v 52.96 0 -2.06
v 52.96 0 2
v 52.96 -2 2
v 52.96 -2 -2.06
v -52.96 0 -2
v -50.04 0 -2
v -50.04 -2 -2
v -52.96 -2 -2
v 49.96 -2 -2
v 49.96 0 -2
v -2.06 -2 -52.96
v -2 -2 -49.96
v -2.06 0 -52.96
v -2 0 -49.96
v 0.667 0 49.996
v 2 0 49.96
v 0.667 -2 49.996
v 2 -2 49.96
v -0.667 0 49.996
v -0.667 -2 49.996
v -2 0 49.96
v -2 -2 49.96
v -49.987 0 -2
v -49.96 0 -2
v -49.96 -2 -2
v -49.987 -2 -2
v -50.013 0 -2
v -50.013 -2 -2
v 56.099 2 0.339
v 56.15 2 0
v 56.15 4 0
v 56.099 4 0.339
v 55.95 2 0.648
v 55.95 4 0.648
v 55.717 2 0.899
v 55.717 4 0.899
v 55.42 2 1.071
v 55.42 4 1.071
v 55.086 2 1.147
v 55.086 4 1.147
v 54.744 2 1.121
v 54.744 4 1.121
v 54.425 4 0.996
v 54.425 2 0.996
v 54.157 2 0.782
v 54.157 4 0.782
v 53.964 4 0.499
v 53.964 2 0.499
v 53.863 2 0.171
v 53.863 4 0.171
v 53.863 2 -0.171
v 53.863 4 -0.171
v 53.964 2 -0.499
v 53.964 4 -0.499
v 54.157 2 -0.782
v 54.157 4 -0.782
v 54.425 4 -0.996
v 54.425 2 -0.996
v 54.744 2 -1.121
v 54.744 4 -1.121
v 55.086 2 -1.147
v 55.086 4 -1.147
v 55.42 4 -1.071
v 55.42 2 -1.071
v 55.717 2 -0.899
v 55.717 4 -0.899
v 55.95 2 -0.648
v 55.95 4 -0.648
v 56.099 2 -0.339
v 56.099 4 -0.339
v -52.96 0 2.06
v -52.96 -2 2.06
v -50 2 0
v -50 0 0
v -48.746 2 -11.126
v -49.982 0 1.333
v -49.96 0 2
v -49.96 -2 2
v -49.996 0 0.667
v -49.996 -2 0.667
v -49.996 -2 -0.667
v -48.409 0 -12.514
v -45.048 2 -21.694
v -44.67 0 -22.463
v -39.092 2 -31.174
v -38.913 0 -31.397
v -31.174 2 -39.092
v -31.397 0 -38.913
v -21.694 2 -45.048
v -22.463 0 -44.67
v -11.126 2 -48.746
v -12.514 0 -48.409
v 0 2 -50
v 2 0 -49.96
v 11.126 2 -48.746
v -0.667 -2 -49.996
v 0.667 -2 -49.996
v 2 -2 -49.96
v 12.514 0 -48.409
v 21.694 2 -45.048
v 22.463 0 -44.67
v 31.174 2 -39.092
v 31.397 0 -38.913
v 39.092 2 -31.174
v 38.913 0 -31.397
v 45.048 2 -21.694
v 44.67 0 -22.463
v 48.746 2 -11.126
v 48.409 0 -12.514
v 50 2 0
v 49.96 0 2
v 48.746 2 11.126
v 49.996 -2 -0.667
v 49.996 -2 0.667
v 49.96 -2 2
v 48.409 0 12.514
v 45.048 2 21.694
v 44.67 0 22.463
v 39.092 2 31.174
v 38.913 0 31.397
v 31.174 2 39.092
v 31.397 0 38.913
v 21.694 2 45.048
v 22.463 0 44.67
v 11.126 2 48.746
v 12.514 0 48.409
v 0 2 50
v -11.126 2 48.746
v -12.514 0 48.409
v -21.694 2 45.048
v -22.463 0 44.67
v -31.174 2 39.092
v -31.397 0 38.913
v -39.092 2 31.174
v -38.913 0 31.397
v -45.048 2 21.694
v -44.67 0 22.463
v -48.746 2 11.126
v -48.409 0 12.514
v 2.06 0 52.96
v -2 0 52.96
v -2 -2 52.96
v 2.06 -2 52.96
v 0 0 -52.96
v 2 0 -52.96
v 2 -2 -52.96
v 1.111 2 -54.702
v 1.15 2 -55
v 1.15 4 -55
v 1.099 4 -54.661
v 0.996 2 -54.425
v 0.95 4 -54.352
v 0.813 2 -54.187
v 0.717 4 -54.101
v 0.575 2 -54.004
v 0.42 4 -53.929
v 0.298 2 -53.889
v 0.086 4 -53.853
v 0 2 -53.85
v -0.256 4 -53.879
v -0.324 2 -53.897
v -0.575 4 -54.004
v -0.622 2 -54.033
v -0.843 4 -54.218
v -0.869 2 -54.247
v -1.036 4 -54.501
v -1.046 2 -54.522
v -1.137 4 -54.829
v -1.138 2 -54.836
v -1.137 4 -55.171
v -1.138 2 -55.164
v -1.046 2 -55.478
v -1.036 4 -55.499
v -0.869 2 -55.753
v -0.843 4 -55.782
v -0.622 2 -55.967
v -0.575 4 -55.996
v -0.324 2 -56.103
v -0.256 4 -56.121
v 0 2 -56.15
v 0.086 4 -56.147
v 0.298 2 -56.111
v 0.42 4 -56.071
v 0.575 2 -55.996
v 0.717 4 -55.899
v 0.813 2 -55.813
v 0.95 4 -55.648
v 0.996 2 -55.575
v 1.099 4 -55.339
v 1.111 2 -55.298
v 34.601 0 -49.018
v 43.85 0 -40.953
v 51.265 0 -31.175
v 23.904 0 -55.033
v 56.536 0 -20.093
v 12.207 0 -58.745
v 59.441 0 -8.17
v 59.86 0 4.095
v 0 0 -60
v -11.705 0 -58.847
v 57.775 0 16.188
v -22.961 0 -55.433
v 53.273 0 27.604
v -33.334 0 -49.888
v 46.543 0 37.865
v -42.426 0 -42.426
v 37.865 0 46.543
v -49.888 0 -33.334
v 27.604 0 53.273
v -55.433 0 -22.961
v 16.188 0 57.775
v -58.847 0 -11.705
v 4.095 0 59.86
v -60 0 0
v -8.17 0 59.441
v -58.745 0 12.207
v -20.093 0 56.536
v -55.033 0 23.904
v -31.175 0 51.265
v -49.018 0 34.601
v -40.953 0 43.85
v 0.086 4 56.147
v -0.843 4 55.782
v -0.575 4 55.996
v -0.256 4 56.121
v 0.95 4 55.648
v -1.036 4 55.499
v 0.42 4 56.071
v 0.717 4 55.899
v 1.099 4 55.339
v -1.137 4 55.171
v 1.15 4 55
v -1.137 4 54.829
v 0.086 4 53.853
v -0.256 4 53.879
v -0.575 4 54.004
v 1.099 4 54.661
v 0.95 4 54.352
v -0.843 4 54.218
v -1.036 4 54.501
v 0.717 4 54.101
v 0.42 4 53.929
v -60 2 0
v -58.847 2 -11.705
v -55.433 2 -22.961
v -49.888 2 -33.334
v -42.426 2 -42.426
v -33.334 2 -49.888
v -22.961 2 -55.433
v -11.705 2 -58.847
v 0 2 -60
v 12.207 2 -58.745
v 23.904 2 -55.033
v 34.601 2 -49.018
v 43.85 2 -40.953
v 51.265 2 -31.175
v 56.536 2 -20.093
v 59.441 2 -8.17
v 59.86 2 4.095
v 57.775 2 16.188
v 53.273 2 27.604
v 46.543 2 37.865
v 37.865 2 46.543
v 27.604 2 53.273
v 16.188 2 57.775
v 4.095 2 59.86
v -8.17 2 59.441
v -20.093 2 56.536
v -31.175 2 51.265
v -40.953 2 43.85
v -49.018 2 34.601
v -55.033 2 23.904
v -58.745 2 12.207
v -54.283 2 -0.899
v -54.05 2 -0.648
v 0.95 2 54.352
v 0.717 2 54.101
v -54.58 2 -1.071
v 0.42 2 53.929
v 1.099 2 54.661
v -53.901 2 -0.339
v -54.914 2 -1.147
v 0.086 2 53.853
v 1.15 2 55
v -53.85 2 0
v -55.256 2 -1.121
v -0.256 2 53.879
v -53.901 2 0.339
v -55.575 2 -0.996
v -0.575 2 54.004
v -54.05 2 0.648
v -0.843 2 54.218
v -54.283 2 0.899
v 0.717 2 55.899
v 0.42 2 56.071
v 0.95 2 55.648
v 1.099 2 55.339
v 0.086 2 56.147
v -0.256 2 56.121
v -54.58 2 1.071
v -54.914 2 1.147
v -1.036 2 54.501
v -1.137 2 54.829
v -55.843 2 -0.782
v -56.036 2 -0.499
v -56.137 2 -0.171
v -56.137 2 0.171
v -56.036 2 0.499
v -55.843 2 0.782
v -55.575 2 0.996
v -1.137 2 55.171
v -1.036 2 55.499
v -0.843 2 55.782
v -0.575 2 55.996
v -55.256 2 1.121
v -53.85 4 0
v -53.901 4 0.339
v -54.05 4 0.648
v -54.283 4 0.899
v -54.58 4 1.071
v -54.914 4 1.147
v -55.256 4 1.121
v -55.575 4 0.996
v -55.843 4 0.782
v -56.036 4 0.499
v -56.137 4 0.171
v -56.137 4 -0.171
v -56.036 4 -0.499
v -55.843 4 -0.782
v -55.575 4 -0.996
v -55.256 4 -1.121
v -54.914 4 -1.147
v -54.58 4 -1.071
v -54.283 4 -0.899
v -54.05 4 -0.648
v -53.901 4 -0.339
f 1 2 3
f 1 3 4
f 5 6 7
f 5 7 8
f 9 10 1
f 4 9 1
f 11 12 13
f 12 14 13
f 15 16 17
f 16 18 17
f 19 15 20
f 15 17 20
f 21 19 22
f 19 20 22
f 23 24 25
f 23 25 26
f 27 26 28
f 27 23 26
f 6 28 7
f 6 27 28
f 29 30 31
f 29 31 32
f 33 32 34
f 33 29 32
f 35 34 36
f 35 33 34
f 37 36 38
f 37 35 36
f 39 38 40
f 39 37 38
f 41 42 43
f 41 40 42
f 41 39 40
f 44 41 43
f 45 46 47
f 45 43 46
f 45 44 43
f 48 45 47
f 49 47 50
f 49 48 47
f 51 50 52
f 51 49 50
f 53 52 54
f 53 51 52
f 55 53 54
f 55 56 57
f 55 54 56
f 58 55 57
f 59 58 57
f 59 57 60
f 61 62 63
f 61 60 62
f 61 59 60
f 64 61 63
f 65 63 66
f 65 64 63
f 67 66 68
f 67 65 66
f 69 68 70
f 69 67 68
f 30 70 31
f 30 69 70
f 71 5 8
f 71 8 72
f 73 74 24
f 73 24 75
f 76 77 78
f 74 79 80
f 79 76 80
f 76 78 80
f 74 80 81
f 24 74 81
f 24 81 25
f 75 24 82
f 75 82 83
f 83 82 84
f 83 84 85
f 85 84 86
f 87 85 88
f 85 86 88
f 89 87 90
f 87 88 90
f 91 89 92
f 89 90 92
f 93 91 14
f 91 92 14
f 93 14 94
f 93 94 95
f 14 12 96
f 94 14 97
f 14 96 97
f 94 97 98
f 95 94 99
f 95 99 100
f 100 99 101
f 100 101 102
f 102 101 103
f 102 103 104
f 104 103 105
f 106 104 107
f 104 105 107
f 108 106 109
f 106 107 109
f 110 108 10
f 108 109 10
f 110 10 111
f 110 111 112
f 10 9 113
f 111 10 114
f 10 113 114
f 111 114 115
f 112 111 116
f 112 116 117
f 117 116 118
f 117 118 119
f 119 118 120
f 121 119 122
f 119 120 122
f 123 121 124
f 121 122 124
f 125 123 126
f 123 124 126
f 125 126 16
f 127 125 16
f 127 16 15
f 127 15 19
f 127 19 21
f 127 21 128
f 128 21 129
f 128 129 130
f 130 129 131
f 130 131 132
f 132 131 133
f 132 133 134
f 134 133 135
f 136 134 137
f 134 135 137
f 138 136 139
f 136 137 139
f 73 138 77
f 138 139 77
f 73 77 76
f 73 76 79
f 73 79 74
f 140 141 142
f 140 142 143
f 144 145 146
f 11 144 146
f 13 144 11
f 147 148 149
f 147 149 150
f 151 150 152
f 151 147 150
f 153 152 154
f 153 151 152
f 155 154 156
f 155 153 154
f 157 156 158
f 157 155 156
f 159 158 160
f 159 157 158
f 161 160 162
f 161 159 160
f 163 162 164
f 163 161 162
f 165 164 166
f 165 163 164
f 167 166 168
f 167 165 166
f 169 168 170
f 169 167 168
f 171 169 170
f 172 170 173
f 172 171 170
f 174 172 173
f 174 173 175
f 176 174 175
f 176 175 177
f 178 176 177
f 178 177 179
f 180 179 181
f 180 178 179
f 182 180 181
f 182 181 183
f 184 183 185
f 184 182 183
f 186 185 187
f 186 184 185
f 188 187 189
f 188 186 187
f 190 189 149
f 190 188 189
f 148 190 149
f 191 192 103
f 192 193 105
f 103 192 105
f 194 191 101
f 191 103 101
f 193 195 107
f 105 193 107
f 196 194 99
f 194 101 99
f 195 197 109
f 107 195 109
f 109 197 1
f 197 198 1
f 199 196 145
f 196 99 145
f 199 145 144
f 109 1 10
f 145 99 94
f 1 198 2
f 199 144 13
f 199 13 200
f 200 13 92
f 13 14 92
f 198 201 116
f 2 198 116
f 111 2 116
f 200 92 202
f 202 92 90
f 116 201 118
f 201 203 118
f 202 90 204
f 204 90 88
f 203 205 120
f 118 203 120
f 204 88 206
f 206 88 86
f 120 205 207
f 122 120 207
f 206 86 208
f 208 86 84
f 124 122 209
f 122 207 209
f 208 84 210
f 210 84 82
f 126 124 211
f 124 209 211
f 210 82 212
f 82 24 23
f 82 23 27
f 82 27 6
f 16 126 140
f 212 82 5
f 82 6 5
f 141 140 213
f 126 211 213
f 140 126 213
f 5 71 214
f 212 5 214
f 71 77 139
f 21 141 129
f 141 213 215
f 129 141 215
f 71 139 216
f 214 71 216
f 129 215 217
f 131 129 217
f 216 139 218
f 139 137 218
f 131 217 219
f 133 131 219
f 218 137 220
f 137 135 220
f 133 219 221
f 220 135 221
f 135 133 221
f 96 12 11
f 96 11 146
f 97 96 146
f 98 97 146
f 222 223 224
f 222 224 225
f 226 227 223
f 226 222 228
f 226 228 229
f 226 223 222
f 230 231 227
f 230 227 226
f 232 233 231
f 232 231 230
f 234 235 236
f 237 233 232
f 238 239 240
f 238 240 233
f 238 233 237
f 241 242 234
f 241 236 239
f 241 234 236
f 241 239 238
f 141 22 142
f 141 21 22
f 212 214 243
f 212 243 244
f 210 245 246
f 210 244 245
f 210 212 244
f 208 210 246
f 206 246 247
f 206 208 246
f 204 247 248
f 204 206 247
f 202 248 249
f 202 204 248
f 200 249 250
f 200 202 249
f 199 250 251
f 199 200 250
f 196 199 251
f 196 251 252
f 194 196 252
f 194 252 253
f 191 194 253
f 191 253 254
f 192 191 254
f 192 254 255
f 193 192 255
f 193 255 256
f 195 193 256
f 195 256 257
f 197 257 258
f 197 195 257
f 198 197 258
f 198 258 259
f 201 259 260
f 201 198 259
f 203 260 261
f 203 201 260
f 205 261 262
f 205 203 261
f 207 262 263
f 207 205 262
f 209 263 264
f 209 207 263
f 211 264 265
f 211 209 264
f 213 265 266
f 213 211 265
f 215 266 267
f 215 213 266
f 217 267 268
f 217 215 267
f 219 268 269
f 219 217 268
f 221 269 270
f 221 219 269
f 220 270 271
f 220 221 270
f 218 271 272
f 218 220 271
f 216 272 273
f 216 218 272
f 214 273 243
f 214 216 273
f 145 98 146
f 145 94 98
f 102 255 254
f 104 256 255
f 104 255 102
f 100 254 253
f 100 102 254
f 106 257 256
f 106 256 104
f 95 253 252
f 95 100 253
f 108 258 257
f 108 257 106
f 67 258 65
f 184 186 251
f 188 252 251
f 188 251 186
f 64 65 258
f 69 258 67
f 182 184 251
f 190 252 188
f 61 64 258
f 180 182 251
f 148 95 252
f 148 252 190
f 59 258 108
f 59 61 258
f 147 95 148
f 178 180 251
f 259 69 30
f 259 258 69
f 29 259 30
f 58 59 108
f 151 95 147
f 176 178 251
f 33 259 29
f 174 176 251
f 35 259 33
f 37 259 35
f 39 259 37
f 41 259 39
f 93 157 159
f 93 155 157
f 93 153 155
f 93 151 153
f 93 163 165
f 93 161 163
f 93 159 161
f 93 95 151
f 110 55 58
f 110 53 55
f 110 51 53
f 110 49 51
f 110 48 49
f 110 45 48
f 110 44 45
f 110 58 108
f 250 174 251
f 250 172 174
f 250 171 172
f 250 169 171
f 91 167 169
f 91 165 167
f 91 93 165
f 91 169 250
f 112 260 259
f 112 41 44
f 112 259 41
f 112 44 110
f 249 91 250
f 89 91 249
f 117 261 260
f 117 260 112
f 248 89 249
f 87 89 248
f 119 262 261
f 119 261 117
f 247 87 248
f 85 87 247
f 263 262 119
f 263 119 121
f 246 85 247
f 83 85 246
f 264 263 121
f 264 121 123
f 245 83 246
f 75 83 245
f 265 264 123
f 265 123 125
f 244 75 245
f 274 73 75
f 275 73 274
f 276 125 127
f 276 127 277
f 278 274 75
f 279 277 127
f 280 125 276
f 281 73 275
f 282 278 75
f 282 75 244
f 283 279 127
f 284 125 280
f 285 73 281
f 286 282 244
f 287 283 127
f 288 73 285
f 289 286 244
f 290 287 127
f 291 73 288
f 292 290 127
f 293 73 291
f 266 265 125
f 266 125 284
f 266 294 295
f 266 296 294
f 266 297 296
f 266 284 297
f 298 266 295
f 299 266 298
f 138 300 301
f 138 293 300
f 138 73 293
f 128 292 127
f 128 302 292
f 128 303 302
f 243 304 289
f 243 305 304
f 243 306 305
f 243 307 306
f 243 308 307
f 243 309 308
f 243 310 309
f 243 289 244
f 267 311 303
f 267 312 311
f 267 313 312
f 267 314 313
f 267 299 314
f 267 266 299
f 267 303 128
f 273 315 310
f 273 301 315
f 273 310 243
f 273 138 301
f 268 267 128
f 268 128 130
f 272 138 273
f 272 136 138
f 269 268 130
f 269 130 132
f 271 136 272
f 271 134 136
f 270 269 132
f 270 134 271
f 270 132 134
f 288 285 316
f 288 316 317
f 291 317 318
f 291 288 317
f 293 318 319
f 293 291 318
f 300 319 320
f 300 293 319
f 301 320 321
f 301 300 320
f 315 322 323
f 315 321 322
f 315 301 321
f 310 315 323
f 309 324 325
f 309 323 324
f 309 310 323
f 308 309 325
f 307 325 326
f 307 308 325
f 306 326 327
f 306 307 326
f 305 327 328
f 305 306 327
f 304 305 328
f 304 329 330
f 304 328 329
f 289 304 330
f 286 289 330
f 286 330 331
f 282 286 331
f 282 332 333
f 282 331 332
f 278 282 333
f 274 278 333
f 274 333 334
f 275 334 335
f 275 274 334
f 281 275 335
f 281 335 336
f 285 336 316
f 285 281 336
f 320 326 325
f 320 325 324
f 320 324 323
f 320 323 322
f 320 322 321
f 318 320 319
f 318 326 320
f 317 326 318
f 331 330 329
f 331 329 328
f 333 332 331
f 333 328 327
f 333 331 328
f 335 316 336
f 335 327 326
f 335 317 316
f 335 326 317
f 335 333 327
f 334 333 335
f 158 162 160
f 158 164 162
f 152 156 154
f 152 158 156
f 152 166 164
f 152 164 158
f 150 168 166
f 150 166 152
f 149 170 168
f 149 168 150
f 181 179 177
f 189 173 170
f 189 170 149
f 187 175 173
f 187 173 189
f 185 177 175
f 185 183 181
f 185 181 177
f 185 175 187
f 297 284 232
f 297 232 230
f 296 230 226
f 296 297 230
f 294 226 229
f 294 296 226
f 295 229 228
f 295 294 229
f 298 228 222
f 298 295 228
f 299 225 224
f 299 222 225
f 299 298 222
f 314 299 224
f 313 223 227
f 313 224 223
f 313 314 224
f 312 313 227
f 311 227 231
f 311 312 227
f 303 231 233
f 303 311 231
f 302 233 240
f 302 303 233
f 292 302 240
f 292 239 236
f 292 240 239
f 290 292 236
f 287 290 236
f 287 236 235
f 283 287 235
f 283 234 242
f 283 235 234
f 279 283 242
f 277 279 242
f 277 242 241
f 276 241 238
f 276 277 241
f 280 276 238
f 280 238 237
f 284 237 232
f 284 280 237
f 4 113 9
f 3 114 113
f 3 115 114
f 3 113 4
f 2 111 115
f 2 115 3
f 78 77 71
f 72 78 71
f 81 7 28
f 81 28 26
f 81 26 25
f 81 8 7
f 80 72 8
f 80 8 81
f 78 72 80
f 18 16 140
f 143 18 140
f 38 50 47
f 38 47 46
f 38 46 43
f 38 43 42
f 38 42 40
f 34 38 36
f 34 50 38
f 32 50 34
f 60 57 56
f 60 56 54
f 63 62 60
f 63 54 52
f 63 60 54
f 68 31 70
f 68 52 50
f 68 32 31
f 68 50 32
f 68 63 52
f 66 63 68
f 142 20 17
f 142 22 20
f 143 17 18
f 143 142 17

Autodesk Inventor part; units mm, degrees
ref_plane "YZ Plane" through (0, 0, 0) normal (1, 0, 0) x (0, 1, 0)
ref_plane "XZ Plane" through (0, 0, 0) normal (0, 1, 0) x (-1, 0, 0)
ref_plane "XY Plane" through (0, 0, 0) normal (0, 0, 1) x (1, 0, 0)
sketch "Boceto1" plane through (0, 0, 0) normal (0, 1, 0) x (-1, 0, 0)
  circle A0 centre (0, 0) radius 60
  circle A1 centre (0, 0) radius 50
  line L0 (0, 0) -> (0, -60)
  line L1 (0, -60) -> (0, -50)
  circle A2 centre (0, -55) radius 1.15
  dimension "d0" = 120
  dimension "d1" = 100
  dimension "d2" = 2.3
extrude "Extrusión1" add sketch "Boceto1" along normal blind 2 contours A2 L0 | L0 A2 | A0
sketch "Boceto2" plane through (0, 2, 0) normal (0, 1, 0) x (1, 0, 0)
  circle A0 centre (0, 0) radius 50 projected
  line L0 (0, 50) -> (0, 60)
  circle A1 centre (0, 0) radius 60 projected
  circle A2 centre (0, 55) radius 1.15
  circle A3 centre (-55, 0) radius 1.15
  circle A4 centre (0, -55) radius 1.15
  circle A5 centre (55, 0) radius 1.15
  dimension "d5" = 2.3
  dimension "d8" = 360
extrude "Extrusión2" add sketch "Boceto2" along normal blind 2 contours A2 L0 | L0 A2 | A3 | A4 | A5
sketch "Boceto3" plane through (0, 0, 0) normal (0, -1, 0) x (1, 0, 0)
  circle A0 centre (0, 0) radius 50 projected
  line L0 (-50, 0) -> (50, 0)
  arc A1 (-50.04, -1.9996) -> (-49.96, -1.9996) centre (-50, 0) ccw
  line L1 (-50.04, -1.9996) -> (-49.96, -1.9996)
  line L2 (-49.96, -1.9996) -> (-52.96, -1.9996)
  line L3 (-52.96, -1.9996) -> (-52.96, 2.2646)
  line L4 (-49.96, 1.9996) -> (-52.96, 2.0596)
  circle A2 centre (0, 0) radius 50
  line L5 (-28.2117, 44.8649) -> (-24.5188, 46.997)
  line L6 (-23.2483, 44.2664) -> (-24.6963, 46.8945)
  line L7 (-26.7117, 42.2668) -> (-28.2117, 44.8649)
  line L8 (24.7483, 46.8645) -> (28.4412, 44.7324)
  line L9 (26.7117, 42.2668) -> (28.2637, 44.8349)
  line L10 (23.2483, 44.2664) -> (24.7483, 46.8645)
  line L11 (52.96, 1.9996) -> (52.96, -2.2646)
  line L12 (49.96, -1.9996) -> (52.96, -2.0596)
  line L13 (49.96, 1.9996) -> (52.96, 1.9996)
  line L14 (28.2117, -44.8649) -> (24.5188, -46.997)
  line L15 (23.2483, -44.2664) -> (24.6963, -46.8945)
  line L16 (26.7117, -42.2668) -> (28.2117, -44.8649)
  line L17 (-24.7483, -46.8645) -> (-28.4412, -44.7324)
  line L18 (-26.7117, -42.2668) -> (-28.2637, -44.8349)
  line L19 (-23.2483, -44.2664) -> (-24.7483, -46.8645)
  line L20 (1.9996, -49.96) -> (1.9996, -52.96)
  line L21 (1.9996, -52.96) -> (-2.2646, -52.96)
  line L22 (-1.9996, -49.96) -> (-2.0596, -52.96)
  line L23 (49.96, 1.9996) -> (52.96, 1.9996)
  line L24 (52.96, 1.9996) -> (52.96, -2.2646)
  line L25 (49.96, -1.9996) -> (52.96, -2.0596)
  line L26 (-1.9996, 49.96) -> (-1.9996, 52.96)
  line L27 (-1.9996, 52.96) -> (2.2646, 52.96)
  line L28 (1.9996, 49.96) -> (2.0596, 52.96)
  point P0 (-52.96, 1.9996)
  point P1 (-24.7483, 46.8645)
  point P2 (-26.7517, 42.3361)
  point P3 (28.2117, 44.8649)
  point P4 (23.2883, 44.3357)
  point P5 (52.96, -1.9996)
  point P6 (50.04, 1.9996)
  point P7 (24.7483, -46.8645)
  point P8 (26.7517, -42.3361)
  point P9 (-28.2117, -44.8649)
  point P10 (-23.2883, -44.3357)
  point P11 (1.9996, -50.04)
  point P12 (-1.9996, -52.96)
  point P13 (50.04, 1.9996)
  point P14 (52.96, -1.9996)
  point P15 (-1.9996, 50.04)
  point P16 (1.9996, 52.96)
  dimension "d13" = 3
  dimension "d14" = 100
  dimension "d17" = 360
  dimension "d21" = 360
extrude "Extrusión3" add sketch "Boceto3" along normal blind 2 contours A0 L13 L11 L12 | A0 A1 L2 L3 L4 | A0 L26 L27 L28 | L20 L21 L22 A0
properties part number "ayudasoporte"
